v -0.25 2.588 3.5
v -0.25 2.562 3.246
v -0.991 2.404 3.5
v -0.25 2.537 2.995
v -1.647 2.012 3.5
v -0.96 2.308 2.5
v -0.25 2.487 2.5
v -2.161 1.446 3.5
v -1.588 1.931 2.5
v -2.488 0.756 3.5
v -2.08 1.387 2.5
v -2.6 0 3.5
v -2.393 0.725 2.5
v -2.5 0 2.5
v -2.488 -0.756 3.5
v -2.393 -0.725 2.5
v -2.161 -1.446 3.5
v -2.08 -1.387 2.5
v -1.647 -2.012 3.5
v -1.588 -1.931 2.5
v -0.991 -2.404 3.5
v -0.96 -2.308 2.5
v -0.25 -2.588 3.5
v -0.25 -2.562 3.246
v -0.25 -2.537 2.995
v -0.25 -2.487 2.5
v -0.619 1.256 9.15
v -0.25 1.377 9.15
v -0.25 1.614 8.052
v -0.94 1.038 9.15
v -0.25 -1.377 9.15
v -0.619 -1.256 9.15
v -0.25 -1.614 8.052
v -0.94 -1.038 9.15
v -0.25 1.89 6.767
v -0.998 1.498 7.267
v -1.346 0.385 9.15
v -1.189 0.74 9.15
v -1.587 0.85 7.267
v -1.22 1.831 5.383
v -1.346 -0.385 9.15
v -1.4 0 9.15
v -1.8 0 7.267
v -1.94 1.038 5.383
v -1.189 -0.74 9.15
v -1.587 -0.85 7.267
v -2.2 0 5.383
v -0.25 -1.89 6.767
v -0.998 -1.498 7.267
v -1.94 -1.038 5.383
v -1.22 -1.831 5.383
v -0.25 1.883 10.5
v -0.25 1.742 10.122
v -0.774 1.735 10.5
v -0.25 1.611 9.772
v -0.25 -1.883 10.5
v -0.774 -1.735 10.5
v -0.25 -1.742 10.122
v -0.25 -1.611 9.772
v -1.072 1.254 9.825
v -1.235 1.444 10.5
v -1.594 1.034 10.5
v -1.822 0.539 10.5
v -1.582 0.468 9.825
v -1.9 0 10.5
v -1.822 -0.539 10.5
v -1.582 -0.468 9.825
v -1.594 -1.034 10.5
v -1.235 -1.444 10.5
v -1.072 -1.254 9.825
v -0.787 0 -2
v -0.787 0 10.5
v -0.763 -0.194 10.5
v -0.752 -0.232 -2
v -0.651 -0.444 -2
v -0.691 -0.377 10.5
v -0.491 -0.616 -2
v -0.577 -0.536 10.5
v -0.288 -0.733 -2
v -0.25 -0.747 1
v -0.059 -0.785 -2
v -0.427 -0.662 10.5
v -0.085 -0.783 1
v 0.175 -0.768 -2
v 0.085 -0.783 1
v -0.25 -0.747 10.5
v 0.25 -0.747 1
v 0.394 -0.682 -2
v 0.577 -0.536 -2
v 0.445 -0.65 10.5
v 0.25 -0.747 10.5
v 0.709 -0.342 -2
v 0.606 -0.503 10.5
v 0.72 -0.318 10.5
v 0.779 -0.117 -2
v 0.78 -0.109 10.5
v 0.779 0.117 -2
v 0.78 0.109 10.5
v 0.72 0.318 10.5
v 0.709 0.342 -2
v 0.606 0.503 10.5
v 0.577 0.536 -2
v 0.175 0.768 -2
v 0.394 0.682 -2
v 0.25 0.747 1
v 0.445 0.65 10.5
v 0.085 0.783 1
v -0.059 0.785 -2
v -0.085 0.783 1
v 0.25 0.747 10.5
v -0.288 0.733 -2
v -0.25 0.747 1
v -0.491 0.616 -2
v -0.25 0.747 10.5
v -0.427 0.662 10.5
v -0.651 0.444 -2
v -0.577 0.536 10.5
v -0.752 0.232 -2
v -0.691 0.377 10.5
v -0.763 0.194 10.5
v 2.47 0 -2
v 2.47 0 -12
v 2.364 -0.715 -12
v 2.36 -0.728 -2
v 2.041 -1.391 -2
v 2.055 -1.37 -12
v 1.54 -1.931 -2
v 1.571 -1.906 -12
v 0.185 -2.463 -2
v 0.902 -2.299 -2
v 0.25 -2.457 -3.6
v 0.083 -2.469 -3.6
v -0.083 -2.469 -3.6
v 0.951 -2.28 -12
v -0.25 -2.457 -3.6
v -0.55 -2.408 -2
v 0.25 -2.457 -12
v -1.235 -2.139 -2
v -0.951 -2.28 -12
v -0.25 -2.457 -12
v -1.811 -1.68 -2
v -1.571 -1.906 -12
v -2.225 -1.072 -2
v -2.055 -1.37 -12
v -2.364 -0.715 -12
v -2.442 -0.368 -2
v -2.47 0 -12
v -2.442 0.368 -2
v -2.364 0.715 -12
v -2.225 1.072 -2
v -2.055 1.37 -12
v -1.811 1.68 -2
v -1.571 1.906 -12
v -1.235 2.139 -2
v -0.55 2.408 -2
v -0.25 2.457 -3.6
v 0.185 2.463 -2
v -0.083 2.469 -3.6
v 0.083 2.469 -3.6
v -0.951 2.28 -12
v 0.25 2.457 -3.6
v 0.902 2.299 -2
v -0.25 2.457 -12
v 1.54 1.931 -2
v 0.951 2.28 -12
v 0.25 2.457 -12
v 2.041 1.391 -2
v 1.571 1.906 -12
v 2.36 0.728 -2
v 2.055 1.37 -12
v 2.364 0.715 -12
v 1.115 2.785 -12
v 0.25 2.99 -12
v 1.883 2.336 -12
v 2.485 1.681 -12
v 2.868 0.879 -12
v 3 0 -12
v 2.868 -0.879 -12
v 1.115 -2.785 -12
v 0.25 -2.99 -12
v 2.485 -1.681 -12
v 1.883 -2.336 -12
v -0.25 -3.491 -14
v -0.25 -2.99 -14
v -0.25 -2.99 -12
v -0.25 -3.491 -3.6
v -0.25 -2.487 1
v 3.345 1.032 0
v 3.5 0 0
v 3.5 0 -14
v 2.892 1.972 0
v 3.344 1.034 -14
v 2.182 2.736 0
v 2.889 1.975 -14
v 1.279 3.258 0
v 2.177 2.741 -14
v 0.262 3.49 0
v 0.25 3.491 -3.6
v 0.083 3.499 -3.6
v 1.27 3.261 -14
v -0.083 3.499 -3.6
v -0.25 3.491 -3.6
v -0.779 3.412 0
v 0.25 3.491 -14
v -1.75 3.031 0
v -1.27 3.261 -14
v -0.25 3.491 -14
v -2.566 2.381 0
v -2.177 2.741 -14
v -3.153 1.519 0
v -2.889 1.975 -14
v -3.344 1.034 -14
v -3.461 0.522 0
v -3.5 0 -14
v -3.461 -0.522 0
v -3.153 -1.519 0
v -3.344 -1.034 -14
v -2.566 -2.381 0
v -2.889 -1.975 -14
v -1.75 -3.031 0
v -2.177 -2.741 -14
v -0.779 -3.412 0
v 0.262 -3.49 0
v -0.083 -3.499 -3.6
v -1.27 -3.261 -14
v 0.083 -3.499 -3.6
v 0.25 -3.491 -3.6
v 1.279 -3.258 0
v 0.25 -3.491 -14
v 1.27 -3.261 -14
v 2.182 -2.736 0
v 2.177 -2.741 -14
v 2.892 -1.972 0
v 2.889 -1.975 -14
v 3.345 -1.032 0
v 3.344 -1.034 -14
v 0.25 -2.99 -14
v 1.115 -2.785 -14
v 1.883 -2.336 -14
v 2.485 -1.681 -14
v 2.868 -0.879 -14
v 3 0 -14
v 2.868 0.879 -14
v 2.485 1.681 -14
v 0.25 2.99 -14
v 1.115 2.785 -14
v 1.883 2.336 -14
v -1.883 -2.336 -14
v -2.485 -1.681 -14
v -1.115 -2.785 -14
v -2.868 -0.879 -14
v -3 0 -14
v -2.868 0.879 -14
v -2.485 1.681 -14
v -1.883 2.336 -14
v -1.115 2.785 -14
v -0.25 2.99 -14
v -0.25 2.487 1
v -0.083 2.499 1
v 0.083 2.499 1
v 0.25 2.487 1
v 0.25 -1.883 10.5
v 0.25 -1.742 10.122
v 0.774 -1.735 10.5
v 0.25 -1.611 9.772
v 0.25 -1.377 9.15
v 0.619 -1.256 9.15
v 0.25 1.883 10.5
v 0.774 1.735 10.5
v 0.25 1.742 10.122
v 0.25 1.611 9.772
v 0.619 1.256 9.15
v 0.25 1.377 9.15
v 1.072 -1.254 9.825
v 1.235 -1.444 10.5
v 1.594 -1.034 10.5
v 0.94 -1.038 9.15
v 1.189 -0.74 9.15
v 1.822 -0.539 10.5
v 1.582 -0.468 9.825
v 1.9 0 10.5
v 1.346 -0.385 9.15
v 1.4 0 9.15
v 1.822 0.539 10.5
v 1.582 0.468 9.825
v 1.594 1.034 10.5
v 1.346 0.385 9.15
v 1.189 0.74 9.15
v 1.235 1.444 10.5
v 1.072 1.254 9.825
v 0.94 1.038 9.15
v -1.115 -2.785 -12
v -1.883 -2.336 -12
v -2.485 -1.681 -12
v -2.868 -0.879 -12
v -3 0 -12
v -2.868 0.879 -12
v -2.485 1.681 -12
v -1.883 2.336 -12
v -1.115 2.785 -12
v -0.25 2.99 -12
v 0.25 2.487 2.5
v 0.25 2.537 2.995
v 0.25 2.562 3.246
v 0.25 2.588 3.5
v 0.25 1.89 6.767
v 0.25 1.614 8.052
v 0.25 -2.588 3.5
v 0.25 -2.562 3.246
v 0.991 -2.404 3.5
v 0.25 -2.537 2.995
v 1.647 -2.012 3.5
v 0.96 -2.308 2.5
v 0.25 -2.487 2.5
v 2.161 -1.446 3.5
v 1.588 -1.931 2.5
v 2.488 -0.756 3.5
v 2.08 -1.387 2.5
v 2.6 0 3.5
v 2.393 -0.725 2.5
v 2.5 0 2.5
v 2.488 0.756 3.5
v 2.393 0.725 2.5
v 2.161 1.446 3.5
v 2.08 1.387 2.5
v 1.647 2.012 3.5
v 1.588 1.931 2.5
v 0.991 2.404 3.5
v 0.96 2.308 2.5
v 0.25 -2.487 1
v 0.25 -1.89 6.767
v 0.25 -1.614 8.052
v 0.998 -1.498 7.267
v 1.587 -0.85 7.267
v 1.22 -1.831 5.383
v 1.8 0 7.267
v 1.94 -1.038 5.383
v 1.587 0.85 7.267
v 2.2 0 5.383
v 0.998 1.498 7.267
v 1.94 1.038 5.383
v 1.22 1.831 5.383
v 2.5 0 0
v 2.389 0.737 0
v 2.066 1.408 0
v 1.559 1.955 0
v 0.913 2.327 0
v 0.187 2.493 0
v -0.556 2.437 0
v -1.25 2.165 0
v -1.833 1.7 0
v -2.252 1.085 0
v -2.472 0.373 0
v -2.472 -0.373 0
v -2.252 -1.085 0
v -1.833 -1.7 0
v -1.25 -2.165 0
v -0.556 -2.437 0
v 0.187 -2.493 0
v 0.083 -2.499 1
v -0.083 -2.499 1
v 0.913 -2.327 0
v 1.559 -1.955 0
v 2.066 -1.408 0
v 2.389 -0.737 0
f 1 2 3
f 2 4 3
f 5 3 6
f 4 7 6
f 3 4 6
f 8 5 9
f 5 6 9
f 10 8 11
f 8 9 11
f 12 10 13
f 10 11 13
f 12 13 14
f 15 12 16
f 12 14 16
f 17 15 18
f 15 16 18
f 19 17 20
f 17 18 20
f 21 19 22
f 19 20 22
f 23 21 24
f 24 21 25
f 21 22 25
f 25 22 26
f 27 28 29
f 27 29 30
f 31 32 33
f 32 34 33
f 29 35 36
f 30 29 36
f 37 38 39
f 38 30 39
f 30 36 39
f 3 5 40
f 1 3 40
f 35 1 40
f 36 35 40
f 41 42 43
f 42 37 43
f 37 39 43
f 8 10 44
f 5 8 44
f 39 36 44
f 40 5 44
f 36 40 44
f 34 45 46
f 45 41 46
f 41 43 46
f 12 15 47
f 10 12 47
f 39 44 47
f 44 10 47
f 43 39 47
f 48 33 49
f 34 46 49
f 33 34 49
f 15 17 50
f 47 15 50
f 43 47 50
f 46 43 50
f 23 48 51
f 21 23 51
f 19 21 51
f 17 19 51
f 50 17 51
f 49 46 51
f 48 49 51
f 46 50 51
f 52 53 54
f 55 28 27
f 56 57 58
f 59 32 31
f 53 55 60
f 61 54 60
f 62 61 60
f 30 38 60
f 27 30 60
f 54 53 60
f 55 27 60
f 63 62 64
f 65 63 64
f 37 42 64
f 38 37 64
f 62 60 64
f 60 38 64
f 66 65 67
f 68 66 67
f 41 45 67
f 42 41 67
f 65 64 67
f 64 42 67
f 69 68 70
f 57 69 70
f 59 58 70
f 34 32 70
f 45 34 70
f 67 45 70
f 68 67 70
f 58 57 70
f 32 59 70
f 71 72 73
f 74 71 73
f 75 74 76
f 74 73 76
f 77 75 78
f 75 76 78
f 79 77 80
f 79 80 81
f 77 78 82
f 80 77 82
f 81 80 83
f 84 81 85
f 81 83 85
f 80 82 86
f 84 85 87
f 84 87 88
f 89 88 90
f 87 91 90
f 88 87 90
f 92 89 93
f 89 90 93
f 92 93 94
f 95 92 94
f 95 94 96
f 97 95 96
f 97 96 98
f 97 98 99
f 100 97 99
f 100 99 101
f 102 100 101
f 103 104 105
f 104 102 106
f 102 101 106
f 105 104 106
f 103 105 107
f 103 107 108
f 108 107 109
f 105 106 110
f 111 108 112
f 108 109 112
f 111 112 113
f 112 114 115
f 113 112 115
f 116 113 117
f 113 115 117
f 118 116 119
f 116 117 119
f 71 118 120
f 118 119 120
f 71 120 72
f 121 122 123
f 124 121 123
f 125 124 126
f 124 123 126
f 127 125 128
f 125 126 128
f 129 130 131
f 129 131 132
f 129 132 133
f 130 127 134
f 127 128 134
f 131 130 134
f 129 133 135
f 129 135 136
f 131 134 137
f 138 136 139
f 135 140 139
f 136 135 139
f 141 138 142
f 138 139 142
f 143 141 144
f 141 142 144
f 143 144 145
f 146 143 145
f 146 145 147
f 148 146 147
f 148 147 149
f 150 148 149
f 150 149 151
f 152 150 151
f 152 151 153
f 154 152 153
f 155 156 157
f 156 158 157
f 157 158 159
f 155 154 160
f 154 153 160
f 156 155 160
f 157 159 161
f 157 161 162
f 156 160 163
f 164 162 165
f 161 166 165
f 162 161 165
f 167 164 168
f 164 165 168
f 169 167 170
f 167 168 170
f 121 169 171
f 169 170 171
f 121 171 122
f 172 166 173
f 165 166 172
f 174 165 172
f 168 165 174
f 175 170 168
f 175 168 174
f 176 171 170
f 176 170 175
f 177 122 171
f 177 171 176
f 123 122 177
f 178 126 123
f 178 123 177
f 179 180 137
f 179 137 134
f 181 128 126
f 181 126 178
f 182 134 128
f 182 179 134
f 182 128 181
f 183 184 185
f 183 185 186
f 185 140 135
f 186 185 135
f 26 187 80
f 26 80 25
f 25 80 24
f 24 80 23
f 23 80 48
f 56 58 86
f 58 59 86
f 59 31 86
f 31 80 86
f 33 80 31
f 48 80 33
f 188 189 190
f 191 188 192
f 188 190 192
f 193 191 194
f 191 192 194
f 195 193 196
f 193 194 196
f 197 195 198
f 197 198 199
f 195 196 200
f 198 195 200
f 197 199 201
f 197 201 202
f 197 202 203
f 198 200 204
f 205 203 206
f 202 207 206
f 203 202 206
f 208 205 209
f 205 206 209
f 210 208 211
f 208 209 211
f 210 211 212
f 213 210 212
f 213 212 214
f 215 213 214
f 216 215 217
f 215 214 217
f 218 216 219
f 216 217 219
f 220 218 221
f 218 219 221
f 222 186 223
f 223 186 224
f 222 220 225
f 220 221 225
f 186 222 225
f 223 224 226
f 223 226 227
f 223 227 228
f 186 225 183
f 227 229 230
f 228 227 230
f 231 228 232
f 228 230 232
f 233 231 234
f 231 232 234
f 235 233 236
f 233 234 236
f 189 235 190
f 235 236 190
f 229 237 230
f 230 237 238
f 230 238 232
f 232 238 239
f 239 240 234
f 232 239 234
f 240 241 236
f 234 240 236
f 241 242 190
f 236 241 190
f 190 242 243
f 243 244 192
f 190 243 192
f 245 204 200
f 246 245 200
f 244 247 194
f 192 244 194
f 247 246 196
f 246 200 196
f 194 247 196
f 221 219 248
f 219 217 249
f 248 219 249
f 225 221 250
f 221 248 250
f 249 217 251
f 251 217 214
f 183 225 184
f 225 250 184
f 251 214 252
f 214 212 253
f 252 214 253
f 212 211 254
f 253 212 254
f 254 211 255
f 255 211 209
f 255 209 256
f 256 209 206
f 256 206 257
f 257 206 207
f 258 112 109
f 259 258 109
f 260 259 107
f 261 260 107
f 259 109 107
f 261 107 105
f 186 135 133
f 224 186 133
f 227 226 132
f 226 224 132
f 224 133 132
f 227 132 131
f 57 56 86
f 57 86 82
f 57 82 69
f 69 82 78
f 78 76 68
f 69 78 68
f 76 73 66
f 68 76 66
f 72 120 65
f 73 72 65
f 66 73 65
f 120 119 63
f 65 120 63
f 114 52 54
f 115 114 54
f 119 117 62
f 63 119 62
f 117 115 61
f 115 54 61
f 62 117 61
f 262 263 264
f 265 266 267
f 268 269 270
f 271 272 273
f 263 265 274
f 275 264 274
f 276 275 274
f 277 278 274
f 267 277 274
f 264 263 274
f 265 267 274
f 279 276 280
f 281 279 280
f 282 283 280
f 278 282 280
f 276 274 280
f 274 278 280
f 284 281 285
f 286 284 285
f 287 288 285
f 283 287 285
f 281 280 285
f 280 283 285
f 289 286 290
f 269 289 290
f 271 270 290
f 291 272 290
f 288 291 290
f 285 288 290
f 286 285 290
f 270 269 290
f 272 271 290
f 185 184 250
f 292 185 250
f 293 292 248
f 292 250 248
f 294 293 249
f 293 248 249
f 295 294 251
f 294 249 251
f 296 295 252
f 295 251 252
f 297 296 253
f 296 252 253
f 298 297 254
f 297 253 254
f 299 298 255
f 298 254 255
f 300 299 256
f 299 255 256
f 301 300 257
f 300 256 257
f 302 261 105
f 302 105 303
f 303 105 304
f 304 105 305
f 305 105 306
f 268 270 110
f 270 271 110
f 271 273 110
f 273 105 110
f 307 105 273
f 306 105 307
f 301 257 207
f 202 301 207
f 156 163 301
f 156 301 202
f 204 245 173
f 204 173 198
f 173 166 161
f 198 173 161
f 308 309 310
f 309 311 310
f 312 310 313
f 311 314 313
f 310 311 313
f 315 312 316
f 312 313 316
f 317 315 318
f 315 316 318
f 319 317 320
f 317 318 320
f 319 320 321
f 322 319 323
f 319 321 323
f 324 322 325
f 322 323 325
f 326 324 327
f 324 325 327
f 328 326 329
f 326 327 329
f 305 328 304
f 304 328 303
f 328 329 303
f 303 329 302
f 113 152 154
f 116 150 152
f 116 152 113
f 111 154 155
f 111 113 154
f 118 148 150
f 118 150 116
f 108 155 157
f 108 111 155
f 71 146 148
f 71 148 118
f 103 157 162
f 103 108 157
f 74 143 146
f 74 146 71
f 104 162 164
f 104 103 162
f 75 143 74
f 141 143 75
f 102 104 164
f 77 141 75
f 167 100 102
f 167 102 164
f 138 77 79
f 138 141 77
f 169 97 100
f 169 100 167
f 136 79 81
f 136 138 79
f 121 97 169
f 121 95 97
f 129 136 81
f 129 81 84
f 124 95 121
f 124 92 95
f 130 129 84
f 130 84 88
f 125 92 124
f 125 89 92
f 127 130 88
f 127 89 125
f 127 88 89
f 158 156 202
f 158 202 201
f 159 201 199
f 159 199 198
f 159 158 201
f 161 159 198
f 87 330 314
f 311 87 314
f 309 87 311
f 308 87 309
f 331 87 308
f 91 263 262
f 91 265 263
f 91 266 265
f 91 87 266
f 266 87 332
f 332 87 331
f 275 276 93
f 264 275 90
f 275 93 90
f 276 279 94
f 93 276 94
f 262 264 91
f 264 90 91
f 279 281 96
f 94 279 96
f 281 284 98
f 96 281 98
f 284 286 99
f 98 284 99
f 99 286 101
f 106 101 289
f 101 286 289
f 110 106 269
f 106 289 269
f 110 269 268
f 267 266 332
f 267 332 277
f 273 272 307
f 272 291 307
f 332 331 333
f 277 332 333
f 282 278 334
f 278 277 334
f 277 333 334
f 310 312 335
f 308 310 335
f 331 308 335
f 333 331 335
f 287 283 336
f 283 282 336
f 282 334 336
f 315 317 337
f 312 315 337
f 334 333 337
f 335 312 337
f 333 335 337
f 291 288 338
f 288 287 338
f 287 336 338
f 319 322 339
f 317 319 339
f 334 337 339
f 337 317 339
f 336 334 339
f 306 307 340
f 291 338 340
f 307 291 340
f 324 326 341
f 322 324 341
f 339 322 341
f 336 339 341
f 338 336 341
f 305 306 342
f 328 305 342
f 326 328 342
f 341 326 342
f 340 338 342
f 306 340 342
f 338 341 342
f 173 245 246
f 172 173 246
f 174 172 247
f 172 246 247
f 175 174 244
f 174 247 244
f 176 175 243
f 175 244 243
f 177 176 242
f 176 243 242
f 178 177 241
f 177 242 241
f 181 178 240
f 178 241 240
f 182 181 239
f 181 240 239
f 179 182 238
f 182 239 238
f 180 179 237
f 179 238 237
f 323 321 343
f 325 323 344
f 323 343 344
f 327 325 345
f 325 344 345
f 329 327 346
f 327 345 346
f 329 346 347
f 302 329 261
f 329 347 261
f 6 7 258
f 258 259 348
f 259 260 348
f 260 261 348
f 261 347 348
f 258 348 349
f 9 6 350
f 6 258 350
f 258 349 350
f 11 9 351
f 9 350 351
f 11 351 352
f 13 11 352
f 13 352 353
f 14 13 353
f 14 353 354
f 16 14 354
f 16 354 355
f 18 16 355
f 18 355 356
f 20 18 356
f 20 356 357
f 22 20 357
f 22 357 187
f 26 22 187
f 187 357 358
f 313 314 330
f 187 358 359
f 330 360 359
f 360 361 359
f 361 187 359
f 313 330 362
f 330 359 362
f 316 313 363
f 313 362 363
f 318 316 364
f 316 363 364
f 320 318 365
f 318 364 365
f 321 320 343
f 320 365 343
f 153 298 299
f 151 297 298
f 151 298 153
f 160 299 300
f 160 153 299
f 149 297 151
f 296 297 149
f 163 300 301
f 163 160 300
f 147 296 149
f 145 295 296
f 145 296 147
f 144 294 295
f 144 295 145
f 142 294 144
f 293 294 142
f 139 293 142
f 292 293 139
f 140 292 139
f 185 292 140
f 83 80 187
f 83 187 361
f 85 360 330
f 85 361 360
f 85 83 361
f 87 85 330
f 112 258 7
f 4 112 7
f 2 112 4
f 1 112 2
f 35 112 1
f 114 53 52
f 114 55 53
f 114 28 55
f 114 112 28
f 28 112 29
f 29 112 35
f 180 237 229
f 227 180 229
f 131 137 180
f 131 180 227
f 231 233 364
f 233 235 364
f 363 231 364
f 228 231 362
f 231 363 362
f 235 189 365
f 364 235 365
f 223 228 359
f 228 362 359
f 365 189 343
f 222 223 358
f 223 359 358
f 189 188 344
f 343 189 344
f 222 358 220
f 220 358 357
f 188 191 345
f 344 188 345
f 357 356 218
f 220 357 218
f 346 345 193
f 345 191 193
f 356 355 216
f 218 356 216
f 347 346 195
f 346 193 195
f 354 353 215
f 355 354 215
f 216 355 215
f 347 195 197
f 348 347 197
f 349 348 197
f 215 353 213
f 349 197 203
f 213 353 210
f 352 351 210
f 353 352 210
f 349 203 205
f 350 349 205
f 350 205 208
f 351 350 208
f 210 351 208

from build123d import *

# Parameters (mm, degrees)
SKETCH001_R          = 2.47
POCKET_DEPTH         = 12
SKETCH002_R          = 0.7874
POCKET001_DEPTH      = 24.501
SKETCH003_R          = 3
POCKET002_DEPTH      = 2
SKETCH004_W          = 0.5
SKETCH004_H          = 15
SKETCH004_H_2        = 13
POCKET003_DEPTH      = 5
POCKET003_DEPTH_BACK = -5


with BuildPart() as part:
    # Sketch → Revolution (revolve)
    with BuildSketch(Plane.XZ):
        Polygon((2.5, 0), (3.5, 0), (3.5, -14), (0, -14), (0, 0), (0, 10.5), (1.9, 10.5), (1.4, 9.15), (2.6, 3.5), (2.5, 2.5), align=None)
    revolve(axis=Axis((0, 0, 0), (0, 0, 1)))

    # Sketch001 (on Face5 of Revolution) → Pocket (cut)
    with BuildSketch(Plane(origin=(0, 0, -14), x_dir=(1, 0, 0), z_dir=(0, 0, -1))):
        Circle(SKETCH001_R)
    extrude(amount=-POCKET_DEPTH, mode=Mode.SUBTRACT)

    # Sketch002 (on Face6 of Pocket) → Pocket001 (cut, through all)
    with BuildSketch(Plane(origin=(0, 0, 10.5), x_dir=(-1, 0, 0), z_dir=(0, 0, 1))):
        Circle(SKETCH002_R)
    extrude(amount=-POCKET001_DEPTH, mode=Mode.SUBTRACT)

    # Sketch003 (on Face9 of Pocket001) → Pocket002 (cut)
    with BuildSketch(Plane(origin=(0, 0, -14), x_dir=(1, 0, 0), z_dir=(0, 0, -1))):
        Circle(SKETCH003_R)
    extrude(amount=-POCKET002_DEPTH, mode=Mode.SUBTRACT)

    # Sketch004 → Pocket003 (cut, two sides)
    with BuildSketch(Plane.XZ) as pocket003_sk:
        with Locations((0, 8.5)):
            Rectangle(SKETCH004_W, SKETCH004_H)
        with Locations((0, -10.1)):
            Rectangle(SKETCH004_W, SKETCH004_H_2)
    extrude(amount=-POCKET003_DEPTH, mode=Mode.SUBTRACT)
    extrude(pocket003_sk.sketch, amount=-POCKET003_DEPTH_BACK, mode=Mode.SUBTRACT)


solid = part.part
